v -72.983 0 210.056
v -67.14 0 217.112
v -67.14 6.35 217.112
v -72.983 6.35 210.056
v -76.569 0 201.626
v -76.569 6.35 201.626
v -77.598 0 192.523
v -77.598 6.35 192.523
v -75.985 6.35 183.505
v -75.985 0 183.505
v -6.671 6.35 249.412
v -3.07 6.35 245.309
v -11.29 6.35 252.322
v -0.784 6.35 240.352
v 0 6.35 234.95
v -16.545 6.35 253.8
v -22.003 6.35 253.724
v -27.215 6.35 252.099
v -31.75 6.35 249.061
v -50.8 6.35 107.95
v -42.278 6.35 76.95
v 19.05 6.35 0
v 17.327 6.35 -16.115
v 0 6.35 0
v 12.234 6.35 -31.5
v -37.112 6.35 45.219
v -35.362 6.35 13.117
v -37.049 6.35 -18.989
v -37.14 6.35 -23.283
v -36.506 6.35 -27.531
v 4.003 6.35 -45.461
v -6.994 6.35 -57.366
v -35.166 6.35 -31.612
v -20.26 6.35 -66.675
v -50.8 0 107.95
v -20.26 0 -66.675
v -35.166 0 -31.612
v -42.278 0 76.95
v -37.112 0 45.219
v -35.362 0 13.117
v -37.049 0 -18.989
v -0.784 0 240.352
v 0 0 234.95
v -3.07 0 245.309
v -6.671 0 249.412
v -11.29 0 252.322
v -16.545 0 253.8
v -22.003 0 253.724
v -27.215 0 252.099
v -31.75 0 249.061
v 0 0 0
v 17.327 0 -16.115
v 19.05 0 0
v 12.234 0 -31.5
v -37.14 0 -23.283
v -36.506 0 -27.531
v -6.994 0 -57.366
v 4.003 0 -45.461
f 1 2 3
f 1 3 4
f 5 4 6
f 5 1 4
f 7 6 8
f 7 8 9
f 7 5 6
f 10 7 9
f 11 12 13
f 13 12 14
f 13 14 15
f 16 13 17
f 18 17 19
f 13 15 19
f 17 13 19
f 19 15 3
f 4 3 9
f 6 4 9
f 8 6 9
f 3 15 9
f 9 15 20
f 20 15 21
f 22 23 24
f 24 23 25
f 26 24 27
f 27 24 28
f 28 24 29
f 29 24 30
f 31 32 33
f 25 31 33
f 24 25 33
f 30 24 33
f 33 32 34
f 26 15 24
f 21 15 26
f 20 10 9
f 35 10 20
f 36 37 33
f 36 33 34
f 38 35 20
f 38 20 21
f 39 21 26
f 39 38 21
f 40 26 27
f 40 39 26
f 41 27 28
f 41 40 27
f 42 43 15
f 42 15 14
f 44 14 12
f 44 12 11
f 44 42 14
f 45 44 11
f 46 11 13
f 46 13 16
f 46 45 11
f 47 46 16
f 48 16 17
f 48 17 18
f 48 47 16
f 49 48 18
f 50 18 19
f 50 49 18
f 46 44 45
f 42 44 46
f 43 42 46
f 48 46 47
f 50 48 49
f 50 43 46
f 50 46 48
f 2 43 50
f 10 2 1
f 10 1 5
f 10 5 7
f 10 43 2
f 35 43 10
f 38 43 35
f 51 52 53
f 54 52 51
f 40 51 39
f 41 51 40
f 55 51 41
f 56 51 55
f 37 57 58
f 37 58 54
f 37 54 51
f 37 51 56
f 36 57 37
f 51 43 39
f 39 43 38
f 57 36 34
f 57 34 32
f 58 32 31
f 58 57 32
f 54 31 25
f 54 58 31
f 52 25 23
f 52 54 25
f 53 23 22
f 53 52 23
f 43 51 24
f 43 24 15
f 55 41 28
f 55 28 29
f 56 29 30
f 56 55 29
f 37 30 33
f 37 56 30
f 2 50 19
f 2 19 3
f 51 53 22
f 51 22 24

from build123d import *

# Parameters (mm, degrees)
BOSS_EXTRUDE1_DEPTH = 6.35


with BuildPart() as part:
    # Sketch1 → Boss-Extrude1 (new body)
    with BuildSketch(Plane(origin=(0, 0, 0), x_dir=(1, 0, 0), z_dir=(0, 1, 0))):
        with BuildLine():
            Line((0, 0), (0, -234.95))
            ThreePointArc((0, -234.95), (-11.289784316, -252.322290845), (-31.75, -249.061111111))
            Line((-31.75, -249.061111111), (-67.13994853, -217.111852022))
            ThreePointArc((-67.13994853, -217.111852022), (-76.568587152, -201.625781937), (-75.984870047, -183.504610141))
            Line((-75.984870047, -183.504610141), (-50.8, -107.95))
            ThreePointArc((-50.8, -107.95), (-37.112138852, -45.218522559), (-37.04854536, 18.988889479))
            ThreePointArc((-37.04854536, 18.988889479), (-36.913147406, 25.420628086), (-35.166213845, 31.612059039))
            Line((-35.166213845, 31.612059039), (-20.259833627, 66.675))
            ThreePointArc((-20.259833627, 66.675), (8.490957784, 38.700189421), (19.05, 0))
            Line((19.05, 0), (0, 0))
        make_face()
    extrude(amount=BOSS_EXTRUDE1_DEPTH)


solid = part.part
